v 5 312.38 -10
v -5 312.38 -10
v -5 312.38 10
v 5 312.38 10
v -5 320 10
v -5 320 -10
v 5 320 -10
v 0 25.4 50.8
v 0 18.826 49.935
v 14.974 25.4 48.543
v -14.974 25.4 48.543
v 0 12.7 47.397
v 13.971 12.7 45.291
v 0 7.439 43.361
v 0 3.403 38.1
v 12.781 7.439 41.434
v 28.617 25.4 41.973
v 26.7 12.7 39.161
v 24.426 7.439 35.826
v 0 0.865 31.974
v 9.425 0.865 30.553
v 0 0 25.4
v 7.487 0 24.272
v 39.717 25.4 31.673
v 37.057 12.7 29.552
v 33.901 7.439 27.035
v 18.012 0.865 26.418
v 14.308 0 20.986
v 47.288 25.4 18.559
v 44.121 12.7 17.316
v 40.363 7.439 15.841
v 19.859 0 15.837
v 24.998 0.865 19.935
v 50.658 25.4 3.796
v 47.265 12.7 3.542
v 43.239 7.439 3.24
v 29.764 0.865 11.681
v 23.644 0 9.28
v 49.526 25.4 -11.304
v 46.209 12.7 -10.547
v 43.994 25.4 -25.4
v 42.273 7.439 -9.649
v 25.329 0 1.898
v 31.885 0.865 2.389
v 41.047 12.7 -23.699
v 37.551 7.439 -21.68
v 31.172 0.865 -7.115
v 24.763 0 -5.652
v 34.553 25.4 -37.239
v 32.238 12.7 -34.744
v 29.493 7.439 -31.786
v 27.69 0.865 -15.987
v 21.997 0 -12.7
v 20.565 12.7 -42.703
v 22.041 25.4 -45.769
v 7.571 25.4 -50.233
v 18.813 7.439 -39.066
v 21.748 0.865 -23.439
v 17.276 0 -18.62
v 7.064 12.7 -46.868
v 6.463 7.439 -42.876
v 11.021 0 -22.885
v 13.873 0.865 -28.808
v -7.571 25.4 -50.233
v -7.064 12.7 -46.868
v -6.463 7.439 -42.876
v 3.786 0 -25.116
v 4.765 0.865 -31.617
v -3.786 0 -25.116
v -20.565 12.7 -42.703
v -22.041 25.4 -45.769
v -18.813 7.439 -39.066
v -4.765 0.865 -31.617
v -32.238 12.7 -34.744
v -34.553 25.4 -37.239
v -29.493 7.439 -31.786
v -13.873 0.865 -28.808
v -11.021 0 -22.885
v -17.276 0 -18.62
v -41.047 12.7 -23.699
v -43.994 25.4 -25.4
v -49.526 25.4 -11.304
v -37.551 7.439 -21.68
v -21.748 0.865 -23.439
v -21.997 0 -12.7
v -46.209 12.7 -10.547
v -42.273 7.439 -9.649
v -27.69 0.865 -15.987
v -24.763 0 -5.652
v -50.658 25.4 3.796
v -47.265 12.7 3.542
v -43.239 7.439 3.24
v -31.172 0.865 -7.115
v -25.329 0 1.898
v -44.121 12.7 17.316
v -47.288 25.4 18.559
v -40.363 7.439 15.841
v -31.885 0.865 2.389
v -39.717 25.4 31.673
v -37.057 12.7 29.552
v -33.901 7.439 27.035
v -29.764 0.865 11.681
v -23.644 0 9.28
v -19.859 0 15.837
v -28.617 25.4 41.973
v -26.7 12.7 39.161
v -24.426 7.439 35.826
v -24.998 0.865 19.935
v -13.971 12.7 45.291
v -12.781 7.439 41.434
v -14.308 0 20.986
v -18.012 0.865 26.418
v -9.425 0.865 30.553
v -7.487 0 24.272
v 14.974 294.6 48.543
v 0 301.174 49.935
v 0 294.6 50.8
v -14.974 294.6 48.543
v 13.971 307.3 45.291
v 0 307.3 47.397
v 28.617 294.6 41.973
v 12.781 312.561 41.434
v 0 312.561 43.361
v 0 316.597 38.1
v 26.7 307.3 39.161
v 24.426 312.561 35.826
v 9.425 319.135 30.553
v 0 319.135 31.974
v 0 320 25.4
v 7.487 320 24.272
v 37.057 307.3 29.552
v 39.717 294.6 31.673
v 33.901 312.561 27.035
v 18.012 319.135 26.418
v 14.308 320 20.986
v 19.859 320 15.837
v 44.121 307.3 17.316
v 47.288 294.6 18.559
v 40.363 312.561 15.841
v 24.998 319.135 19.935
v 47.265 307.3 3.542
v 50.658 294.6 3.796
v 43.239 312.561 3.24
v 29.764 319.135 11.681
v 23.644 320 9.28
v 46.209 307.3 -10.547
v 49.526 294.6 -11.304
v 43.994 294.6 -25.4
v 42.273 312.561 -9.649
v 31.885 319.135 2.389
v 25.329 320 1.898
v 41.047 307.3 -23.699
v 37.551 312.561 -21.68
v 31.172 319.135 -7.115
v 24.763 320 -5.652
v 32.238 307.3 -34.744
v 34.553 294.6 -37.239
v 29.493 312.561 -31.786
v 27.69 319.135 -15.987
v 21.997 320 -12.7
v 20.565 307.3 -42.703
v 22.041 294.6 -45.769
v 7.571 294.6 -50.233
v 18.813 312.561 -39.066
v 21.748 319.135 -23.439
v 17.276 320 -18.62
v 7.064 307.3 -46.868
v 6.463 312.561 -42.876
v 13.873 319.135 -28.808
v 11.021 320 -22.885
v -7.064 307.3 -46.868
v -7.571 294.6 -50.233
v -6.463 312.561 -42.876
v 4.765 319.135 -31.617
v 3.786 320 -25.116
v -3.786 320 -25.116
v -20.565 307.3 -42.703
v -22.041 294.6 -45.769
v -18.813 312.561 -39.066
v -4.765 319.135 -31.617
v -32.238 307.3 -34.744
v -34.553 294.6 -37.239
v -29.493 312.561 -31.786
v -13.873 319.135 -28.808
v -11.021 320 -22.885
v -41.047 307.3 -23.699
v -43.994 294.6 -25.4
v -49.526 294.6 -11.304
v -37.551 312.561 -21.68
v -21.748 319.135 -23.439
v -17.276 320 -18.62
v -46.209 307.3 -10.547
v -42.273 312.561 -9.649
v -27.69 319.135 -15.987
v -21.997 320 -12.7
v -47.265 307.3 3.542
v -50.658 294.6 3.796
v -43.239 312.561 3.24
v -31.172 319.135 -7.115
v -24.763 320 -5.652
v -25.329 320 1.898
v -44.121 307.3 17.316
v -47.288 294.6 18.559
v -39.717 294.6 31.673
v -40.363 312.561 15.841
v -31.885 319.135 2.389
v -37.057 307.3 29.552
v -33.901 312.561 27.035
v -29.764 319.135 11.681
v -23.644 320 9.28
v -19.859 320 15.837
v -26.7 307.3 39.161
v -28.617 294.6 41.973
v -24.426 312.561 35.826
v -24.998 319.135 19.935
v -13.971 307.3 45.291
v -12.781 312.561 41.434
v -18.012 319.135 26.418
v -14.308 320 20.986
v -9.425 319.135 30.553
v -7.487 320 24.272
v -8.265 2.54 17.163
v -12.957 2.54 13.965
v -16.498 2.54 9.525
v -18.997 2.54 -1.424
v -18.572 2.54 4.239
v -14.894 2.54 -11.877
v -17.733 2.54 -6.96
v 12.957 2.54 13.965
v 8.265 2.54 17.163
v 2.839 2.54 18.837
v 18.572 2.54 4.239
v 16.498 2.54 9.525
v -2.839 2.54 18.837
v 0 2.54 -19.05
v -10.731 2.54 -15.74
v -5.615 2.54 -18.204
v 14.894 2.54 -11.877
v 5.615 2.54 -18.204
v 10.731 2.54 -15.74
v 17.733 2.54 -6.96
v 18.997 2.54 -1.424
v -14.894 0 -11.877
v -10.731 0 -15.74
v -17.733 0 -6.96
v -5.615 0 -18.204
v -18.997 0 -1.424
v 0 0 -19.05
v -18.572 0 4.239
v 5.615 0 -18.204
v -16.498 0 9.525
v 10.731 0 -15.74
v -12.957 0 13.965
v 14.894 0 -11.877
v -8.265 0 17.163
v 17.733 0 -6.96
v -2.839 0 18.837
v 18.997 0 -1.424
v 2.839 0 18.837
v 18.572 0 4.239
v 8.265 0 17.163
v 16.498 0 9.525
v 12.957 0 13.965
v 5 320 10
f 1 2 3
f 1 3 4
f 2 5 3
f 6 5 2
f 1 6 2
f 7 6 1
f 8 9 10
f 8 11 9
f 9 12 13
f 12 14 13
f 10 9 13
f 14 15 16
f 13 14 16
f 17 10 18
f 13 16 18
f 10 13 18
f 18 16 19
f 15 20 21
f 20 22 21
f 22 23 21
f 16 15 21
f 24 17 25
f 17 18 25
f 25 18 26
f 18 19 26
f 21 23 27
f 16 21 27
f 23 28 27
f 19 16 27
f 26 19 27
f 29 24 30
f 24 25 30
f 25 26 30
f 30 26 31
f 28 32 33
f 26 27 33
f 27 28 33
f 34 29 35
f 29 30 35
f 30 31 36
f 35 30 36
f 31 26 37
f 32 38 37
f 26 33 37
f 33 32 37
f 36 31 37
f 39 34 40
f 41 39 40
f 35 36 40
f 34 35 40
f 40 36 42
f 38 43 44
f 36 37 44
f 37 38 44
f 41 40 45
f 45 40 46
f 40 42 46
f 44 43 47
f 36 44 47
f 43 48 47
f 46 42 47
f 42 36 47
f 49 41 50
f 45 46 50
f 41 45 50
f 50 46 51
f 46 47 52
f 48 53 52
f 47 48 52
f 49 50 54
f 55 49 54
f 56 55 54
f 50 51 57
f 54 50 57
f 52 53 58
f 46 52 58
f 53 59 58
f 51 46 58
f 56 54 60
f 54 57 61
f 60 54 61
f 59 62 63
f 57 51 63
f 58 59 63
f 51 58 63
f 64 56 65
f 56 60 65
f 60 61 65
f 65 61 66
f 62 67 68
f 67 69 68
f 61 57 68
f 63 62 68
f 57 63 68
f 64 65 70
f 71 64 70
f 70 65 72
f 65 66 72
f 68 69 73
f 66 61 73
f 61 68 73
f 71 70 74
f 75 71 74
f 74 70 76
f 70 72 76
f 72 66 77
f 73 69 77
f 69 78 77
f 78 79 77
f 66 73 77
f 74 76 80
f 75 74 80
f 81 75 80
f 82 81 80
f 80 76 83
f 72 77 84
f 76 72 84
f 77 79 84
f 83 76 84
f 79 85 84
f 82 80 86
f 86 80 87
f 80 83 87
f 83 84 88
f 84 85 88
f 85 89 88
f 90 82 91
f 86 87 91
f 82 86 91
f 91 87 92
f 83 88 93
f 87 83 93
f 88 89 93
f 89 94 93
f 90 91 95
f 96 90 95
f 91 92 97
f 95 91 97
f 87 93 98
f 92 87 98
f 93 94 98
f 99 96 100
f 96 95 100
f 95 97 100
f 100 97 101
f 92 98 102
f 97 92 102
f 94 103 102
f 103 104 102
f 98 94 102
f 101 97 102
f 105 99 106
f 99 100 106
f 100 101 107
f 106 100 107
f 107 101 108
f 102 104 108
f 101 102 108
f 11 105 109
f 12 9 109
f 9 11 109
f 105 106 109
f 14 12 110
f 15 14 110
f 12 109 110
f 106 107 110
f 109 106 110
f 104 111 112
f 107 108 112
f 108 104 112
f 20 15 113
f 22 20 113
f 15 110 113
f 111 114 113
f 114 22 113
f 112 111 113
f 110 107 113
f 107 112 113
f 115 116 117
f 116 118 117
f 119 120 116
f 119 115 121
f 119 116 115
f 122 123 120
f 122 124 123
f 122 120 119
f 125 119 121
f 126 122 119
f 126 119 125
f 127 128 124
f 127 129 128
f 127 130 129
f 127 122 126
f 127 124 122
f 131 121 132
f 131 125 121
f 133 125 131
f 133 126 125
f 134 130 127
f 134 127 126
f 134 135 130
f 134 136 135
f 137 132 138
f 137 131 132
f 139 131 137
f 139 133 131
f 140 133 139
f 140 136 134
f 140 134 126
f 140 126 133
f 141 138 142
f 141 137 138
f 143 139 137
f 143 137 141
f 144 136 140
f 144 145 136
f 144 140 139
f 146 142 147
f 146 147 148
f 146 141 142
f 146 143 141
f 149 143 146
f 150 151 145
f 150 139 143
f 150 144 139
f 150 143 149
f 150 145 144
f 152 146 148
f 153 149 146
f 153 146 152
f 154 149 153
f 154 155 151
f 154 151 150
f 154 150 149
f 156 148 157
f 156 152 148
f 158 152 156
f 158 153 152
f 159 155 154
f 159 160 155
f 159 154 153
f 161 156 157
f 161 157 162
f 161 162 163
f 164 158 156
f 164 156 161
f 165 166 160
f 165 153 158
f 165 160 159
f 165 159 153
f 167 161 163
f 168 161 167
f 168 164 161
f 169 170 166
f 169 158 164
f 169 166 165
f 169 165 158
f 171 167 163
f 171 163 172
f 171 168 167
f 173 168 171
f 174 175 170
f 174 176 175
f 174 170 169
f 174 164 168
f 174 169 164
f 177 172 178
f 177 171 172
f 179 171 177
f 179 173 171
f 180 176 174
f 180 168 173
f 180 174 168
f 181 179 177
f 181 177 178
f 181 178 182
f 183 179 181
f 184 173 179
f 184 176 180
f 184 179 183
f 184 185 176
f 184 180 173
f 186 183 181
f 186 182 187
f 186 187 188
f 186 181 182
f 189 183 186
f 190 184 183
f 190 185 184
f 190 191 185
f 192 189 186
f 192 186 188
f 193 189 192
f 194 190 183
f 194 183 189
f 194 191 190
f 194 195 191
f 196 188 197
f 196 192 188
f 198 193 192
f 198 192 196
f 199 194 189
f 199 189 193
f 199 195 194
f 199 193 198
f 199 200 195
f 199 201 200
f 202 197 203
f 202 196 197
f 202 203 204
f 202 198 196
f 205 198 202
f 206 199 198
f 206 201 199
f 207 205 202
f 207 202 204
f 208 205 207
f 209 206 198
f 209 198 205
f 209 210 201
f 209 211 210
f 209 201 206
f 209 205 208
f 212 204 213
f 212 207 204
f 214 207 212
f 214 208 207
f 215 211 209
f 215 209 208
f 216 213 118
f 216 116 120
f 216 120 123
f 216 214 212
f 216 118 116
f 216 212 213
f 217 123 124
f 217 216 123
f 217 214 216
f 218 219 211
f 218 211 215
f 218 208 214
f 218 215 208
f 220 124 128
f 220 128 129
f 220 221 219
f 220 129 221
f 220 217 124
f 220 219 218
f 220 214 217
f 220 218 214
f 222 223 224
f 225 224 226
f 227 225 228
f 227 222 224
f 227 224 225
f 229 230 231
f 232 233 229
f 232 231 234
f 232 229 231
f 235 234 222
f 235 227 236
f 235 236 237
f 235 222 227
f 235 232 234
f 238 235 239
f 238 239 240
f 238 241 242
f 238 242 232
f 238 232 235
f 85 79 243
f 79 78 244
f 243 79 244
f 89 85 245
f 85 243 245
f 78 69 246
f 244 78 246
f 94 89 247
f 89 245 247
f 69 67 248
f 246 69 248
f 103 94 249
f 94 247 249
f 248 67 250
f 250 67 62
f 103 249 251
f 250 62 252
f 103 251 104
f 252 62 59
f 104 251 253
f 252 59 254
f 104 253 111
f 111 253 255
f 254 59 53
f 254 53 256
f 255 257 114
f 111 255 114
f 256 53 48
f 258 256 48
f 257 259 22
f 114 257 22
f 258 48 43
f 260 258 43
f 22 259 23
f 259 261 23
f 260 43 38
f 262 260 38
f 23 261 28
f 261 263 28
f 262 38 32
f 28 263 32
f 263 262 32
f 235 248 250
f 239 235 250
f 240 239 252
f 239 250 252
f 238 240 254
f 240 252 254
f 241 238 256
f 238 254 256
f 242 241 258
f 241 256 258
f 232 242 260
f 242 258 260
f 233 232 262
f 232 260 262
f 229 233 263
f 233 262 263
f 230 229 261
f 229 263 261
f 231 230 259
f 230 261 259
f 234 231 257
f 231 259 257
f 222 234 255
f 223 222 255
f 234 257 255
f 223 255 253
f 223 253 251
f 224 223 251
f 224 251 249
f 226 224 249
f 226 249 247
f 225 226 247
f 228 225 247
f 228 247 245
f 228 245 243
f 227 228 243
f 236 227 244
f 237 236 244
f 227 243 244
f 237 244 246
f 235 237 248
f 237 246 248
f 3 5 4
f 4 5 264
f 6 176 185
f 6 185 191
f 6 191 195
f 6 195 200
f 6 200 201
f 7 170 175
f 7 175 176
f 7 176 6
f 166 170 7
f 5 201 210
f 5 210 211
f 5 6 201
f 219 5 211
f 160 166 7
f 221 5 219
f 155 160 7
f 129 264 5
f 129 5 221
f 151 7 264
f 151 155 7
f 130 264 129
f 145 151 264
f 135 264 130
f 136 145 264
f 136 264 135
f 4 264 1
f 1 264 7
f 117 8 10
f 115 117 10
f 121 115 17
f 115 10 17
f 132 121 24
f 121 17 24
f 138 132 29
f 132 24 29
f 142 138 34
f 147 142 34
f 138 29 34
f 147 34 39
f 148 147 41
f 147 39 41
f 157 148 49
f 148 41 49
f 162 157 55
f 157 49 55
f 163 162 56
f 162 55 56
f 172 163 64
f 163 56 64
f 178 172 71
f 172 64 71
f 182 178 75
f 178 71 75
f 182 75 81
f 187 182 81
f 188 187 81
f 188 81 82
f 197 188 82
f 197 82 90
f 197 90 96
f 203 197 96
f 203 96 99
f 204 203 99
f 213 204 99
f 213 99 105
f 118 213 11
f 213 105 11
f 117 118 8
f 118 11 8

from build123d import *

# Parameters (mm, degrees)
SKETCH1_R          = 50.8
EXTRUDE1_DEPTH     = 320
FILLET1_R          = 25.4
SKETCH3_W          = 10
SKETCH3_H          = 20
CUT_EXTRUDE1_DEPTH = 7.62
SKETCH4_R          = 19.05
CUT_EXTRUDE2_DEPTH = 2.54


with BuildPart() as part:
    # Sketch1 → Extrude1 (new body)
    with BuildSketch(Plane(origin=(0, 0, 0), x_dir=(1, 0, 0), z_dir=(0, 1, 0))):
        with Locations(Location((0, 0, 0), (0, 0, 270))):
            Circle(SKETCH1_R)
    extrude(amount=EXTRUDE1_DEPTH)

    # Fillet1
    fillet1_edges = [part.edges().sort_by_distance(p)[0] for p in [
        (0, 0, -50.8),
        (0, 320, -50.8),
    ]]
    fillet(fillet1_edges, radius=FILLET1_R)

    # Sketch3 → Cut-Extrude1 (cut)
    with BuildSketch(Plane(origin=(0, 320, 0), x_dir=(1, 0, 0), z_dir=(0, 1, 0))):
        Rectangle(SKETCH3_W, SKETCH3_H)
    extrude(amount=-CUT_EXTRUDE1_DEPTH, mode=Mode.SUBTRACT)

    # Sketch4 → Cut-Extrude2 (cut)
    with BuildSketch(Plane.XZ):
        with Locations(Location((0, 0, 0), (0, 0, 270))):
            Circle(SKETCH4_R)
    extrude(amount=-CUT_EXTRUDE2_DEPTH, mode=Mode.SUBTRACT)


solid = part.part
